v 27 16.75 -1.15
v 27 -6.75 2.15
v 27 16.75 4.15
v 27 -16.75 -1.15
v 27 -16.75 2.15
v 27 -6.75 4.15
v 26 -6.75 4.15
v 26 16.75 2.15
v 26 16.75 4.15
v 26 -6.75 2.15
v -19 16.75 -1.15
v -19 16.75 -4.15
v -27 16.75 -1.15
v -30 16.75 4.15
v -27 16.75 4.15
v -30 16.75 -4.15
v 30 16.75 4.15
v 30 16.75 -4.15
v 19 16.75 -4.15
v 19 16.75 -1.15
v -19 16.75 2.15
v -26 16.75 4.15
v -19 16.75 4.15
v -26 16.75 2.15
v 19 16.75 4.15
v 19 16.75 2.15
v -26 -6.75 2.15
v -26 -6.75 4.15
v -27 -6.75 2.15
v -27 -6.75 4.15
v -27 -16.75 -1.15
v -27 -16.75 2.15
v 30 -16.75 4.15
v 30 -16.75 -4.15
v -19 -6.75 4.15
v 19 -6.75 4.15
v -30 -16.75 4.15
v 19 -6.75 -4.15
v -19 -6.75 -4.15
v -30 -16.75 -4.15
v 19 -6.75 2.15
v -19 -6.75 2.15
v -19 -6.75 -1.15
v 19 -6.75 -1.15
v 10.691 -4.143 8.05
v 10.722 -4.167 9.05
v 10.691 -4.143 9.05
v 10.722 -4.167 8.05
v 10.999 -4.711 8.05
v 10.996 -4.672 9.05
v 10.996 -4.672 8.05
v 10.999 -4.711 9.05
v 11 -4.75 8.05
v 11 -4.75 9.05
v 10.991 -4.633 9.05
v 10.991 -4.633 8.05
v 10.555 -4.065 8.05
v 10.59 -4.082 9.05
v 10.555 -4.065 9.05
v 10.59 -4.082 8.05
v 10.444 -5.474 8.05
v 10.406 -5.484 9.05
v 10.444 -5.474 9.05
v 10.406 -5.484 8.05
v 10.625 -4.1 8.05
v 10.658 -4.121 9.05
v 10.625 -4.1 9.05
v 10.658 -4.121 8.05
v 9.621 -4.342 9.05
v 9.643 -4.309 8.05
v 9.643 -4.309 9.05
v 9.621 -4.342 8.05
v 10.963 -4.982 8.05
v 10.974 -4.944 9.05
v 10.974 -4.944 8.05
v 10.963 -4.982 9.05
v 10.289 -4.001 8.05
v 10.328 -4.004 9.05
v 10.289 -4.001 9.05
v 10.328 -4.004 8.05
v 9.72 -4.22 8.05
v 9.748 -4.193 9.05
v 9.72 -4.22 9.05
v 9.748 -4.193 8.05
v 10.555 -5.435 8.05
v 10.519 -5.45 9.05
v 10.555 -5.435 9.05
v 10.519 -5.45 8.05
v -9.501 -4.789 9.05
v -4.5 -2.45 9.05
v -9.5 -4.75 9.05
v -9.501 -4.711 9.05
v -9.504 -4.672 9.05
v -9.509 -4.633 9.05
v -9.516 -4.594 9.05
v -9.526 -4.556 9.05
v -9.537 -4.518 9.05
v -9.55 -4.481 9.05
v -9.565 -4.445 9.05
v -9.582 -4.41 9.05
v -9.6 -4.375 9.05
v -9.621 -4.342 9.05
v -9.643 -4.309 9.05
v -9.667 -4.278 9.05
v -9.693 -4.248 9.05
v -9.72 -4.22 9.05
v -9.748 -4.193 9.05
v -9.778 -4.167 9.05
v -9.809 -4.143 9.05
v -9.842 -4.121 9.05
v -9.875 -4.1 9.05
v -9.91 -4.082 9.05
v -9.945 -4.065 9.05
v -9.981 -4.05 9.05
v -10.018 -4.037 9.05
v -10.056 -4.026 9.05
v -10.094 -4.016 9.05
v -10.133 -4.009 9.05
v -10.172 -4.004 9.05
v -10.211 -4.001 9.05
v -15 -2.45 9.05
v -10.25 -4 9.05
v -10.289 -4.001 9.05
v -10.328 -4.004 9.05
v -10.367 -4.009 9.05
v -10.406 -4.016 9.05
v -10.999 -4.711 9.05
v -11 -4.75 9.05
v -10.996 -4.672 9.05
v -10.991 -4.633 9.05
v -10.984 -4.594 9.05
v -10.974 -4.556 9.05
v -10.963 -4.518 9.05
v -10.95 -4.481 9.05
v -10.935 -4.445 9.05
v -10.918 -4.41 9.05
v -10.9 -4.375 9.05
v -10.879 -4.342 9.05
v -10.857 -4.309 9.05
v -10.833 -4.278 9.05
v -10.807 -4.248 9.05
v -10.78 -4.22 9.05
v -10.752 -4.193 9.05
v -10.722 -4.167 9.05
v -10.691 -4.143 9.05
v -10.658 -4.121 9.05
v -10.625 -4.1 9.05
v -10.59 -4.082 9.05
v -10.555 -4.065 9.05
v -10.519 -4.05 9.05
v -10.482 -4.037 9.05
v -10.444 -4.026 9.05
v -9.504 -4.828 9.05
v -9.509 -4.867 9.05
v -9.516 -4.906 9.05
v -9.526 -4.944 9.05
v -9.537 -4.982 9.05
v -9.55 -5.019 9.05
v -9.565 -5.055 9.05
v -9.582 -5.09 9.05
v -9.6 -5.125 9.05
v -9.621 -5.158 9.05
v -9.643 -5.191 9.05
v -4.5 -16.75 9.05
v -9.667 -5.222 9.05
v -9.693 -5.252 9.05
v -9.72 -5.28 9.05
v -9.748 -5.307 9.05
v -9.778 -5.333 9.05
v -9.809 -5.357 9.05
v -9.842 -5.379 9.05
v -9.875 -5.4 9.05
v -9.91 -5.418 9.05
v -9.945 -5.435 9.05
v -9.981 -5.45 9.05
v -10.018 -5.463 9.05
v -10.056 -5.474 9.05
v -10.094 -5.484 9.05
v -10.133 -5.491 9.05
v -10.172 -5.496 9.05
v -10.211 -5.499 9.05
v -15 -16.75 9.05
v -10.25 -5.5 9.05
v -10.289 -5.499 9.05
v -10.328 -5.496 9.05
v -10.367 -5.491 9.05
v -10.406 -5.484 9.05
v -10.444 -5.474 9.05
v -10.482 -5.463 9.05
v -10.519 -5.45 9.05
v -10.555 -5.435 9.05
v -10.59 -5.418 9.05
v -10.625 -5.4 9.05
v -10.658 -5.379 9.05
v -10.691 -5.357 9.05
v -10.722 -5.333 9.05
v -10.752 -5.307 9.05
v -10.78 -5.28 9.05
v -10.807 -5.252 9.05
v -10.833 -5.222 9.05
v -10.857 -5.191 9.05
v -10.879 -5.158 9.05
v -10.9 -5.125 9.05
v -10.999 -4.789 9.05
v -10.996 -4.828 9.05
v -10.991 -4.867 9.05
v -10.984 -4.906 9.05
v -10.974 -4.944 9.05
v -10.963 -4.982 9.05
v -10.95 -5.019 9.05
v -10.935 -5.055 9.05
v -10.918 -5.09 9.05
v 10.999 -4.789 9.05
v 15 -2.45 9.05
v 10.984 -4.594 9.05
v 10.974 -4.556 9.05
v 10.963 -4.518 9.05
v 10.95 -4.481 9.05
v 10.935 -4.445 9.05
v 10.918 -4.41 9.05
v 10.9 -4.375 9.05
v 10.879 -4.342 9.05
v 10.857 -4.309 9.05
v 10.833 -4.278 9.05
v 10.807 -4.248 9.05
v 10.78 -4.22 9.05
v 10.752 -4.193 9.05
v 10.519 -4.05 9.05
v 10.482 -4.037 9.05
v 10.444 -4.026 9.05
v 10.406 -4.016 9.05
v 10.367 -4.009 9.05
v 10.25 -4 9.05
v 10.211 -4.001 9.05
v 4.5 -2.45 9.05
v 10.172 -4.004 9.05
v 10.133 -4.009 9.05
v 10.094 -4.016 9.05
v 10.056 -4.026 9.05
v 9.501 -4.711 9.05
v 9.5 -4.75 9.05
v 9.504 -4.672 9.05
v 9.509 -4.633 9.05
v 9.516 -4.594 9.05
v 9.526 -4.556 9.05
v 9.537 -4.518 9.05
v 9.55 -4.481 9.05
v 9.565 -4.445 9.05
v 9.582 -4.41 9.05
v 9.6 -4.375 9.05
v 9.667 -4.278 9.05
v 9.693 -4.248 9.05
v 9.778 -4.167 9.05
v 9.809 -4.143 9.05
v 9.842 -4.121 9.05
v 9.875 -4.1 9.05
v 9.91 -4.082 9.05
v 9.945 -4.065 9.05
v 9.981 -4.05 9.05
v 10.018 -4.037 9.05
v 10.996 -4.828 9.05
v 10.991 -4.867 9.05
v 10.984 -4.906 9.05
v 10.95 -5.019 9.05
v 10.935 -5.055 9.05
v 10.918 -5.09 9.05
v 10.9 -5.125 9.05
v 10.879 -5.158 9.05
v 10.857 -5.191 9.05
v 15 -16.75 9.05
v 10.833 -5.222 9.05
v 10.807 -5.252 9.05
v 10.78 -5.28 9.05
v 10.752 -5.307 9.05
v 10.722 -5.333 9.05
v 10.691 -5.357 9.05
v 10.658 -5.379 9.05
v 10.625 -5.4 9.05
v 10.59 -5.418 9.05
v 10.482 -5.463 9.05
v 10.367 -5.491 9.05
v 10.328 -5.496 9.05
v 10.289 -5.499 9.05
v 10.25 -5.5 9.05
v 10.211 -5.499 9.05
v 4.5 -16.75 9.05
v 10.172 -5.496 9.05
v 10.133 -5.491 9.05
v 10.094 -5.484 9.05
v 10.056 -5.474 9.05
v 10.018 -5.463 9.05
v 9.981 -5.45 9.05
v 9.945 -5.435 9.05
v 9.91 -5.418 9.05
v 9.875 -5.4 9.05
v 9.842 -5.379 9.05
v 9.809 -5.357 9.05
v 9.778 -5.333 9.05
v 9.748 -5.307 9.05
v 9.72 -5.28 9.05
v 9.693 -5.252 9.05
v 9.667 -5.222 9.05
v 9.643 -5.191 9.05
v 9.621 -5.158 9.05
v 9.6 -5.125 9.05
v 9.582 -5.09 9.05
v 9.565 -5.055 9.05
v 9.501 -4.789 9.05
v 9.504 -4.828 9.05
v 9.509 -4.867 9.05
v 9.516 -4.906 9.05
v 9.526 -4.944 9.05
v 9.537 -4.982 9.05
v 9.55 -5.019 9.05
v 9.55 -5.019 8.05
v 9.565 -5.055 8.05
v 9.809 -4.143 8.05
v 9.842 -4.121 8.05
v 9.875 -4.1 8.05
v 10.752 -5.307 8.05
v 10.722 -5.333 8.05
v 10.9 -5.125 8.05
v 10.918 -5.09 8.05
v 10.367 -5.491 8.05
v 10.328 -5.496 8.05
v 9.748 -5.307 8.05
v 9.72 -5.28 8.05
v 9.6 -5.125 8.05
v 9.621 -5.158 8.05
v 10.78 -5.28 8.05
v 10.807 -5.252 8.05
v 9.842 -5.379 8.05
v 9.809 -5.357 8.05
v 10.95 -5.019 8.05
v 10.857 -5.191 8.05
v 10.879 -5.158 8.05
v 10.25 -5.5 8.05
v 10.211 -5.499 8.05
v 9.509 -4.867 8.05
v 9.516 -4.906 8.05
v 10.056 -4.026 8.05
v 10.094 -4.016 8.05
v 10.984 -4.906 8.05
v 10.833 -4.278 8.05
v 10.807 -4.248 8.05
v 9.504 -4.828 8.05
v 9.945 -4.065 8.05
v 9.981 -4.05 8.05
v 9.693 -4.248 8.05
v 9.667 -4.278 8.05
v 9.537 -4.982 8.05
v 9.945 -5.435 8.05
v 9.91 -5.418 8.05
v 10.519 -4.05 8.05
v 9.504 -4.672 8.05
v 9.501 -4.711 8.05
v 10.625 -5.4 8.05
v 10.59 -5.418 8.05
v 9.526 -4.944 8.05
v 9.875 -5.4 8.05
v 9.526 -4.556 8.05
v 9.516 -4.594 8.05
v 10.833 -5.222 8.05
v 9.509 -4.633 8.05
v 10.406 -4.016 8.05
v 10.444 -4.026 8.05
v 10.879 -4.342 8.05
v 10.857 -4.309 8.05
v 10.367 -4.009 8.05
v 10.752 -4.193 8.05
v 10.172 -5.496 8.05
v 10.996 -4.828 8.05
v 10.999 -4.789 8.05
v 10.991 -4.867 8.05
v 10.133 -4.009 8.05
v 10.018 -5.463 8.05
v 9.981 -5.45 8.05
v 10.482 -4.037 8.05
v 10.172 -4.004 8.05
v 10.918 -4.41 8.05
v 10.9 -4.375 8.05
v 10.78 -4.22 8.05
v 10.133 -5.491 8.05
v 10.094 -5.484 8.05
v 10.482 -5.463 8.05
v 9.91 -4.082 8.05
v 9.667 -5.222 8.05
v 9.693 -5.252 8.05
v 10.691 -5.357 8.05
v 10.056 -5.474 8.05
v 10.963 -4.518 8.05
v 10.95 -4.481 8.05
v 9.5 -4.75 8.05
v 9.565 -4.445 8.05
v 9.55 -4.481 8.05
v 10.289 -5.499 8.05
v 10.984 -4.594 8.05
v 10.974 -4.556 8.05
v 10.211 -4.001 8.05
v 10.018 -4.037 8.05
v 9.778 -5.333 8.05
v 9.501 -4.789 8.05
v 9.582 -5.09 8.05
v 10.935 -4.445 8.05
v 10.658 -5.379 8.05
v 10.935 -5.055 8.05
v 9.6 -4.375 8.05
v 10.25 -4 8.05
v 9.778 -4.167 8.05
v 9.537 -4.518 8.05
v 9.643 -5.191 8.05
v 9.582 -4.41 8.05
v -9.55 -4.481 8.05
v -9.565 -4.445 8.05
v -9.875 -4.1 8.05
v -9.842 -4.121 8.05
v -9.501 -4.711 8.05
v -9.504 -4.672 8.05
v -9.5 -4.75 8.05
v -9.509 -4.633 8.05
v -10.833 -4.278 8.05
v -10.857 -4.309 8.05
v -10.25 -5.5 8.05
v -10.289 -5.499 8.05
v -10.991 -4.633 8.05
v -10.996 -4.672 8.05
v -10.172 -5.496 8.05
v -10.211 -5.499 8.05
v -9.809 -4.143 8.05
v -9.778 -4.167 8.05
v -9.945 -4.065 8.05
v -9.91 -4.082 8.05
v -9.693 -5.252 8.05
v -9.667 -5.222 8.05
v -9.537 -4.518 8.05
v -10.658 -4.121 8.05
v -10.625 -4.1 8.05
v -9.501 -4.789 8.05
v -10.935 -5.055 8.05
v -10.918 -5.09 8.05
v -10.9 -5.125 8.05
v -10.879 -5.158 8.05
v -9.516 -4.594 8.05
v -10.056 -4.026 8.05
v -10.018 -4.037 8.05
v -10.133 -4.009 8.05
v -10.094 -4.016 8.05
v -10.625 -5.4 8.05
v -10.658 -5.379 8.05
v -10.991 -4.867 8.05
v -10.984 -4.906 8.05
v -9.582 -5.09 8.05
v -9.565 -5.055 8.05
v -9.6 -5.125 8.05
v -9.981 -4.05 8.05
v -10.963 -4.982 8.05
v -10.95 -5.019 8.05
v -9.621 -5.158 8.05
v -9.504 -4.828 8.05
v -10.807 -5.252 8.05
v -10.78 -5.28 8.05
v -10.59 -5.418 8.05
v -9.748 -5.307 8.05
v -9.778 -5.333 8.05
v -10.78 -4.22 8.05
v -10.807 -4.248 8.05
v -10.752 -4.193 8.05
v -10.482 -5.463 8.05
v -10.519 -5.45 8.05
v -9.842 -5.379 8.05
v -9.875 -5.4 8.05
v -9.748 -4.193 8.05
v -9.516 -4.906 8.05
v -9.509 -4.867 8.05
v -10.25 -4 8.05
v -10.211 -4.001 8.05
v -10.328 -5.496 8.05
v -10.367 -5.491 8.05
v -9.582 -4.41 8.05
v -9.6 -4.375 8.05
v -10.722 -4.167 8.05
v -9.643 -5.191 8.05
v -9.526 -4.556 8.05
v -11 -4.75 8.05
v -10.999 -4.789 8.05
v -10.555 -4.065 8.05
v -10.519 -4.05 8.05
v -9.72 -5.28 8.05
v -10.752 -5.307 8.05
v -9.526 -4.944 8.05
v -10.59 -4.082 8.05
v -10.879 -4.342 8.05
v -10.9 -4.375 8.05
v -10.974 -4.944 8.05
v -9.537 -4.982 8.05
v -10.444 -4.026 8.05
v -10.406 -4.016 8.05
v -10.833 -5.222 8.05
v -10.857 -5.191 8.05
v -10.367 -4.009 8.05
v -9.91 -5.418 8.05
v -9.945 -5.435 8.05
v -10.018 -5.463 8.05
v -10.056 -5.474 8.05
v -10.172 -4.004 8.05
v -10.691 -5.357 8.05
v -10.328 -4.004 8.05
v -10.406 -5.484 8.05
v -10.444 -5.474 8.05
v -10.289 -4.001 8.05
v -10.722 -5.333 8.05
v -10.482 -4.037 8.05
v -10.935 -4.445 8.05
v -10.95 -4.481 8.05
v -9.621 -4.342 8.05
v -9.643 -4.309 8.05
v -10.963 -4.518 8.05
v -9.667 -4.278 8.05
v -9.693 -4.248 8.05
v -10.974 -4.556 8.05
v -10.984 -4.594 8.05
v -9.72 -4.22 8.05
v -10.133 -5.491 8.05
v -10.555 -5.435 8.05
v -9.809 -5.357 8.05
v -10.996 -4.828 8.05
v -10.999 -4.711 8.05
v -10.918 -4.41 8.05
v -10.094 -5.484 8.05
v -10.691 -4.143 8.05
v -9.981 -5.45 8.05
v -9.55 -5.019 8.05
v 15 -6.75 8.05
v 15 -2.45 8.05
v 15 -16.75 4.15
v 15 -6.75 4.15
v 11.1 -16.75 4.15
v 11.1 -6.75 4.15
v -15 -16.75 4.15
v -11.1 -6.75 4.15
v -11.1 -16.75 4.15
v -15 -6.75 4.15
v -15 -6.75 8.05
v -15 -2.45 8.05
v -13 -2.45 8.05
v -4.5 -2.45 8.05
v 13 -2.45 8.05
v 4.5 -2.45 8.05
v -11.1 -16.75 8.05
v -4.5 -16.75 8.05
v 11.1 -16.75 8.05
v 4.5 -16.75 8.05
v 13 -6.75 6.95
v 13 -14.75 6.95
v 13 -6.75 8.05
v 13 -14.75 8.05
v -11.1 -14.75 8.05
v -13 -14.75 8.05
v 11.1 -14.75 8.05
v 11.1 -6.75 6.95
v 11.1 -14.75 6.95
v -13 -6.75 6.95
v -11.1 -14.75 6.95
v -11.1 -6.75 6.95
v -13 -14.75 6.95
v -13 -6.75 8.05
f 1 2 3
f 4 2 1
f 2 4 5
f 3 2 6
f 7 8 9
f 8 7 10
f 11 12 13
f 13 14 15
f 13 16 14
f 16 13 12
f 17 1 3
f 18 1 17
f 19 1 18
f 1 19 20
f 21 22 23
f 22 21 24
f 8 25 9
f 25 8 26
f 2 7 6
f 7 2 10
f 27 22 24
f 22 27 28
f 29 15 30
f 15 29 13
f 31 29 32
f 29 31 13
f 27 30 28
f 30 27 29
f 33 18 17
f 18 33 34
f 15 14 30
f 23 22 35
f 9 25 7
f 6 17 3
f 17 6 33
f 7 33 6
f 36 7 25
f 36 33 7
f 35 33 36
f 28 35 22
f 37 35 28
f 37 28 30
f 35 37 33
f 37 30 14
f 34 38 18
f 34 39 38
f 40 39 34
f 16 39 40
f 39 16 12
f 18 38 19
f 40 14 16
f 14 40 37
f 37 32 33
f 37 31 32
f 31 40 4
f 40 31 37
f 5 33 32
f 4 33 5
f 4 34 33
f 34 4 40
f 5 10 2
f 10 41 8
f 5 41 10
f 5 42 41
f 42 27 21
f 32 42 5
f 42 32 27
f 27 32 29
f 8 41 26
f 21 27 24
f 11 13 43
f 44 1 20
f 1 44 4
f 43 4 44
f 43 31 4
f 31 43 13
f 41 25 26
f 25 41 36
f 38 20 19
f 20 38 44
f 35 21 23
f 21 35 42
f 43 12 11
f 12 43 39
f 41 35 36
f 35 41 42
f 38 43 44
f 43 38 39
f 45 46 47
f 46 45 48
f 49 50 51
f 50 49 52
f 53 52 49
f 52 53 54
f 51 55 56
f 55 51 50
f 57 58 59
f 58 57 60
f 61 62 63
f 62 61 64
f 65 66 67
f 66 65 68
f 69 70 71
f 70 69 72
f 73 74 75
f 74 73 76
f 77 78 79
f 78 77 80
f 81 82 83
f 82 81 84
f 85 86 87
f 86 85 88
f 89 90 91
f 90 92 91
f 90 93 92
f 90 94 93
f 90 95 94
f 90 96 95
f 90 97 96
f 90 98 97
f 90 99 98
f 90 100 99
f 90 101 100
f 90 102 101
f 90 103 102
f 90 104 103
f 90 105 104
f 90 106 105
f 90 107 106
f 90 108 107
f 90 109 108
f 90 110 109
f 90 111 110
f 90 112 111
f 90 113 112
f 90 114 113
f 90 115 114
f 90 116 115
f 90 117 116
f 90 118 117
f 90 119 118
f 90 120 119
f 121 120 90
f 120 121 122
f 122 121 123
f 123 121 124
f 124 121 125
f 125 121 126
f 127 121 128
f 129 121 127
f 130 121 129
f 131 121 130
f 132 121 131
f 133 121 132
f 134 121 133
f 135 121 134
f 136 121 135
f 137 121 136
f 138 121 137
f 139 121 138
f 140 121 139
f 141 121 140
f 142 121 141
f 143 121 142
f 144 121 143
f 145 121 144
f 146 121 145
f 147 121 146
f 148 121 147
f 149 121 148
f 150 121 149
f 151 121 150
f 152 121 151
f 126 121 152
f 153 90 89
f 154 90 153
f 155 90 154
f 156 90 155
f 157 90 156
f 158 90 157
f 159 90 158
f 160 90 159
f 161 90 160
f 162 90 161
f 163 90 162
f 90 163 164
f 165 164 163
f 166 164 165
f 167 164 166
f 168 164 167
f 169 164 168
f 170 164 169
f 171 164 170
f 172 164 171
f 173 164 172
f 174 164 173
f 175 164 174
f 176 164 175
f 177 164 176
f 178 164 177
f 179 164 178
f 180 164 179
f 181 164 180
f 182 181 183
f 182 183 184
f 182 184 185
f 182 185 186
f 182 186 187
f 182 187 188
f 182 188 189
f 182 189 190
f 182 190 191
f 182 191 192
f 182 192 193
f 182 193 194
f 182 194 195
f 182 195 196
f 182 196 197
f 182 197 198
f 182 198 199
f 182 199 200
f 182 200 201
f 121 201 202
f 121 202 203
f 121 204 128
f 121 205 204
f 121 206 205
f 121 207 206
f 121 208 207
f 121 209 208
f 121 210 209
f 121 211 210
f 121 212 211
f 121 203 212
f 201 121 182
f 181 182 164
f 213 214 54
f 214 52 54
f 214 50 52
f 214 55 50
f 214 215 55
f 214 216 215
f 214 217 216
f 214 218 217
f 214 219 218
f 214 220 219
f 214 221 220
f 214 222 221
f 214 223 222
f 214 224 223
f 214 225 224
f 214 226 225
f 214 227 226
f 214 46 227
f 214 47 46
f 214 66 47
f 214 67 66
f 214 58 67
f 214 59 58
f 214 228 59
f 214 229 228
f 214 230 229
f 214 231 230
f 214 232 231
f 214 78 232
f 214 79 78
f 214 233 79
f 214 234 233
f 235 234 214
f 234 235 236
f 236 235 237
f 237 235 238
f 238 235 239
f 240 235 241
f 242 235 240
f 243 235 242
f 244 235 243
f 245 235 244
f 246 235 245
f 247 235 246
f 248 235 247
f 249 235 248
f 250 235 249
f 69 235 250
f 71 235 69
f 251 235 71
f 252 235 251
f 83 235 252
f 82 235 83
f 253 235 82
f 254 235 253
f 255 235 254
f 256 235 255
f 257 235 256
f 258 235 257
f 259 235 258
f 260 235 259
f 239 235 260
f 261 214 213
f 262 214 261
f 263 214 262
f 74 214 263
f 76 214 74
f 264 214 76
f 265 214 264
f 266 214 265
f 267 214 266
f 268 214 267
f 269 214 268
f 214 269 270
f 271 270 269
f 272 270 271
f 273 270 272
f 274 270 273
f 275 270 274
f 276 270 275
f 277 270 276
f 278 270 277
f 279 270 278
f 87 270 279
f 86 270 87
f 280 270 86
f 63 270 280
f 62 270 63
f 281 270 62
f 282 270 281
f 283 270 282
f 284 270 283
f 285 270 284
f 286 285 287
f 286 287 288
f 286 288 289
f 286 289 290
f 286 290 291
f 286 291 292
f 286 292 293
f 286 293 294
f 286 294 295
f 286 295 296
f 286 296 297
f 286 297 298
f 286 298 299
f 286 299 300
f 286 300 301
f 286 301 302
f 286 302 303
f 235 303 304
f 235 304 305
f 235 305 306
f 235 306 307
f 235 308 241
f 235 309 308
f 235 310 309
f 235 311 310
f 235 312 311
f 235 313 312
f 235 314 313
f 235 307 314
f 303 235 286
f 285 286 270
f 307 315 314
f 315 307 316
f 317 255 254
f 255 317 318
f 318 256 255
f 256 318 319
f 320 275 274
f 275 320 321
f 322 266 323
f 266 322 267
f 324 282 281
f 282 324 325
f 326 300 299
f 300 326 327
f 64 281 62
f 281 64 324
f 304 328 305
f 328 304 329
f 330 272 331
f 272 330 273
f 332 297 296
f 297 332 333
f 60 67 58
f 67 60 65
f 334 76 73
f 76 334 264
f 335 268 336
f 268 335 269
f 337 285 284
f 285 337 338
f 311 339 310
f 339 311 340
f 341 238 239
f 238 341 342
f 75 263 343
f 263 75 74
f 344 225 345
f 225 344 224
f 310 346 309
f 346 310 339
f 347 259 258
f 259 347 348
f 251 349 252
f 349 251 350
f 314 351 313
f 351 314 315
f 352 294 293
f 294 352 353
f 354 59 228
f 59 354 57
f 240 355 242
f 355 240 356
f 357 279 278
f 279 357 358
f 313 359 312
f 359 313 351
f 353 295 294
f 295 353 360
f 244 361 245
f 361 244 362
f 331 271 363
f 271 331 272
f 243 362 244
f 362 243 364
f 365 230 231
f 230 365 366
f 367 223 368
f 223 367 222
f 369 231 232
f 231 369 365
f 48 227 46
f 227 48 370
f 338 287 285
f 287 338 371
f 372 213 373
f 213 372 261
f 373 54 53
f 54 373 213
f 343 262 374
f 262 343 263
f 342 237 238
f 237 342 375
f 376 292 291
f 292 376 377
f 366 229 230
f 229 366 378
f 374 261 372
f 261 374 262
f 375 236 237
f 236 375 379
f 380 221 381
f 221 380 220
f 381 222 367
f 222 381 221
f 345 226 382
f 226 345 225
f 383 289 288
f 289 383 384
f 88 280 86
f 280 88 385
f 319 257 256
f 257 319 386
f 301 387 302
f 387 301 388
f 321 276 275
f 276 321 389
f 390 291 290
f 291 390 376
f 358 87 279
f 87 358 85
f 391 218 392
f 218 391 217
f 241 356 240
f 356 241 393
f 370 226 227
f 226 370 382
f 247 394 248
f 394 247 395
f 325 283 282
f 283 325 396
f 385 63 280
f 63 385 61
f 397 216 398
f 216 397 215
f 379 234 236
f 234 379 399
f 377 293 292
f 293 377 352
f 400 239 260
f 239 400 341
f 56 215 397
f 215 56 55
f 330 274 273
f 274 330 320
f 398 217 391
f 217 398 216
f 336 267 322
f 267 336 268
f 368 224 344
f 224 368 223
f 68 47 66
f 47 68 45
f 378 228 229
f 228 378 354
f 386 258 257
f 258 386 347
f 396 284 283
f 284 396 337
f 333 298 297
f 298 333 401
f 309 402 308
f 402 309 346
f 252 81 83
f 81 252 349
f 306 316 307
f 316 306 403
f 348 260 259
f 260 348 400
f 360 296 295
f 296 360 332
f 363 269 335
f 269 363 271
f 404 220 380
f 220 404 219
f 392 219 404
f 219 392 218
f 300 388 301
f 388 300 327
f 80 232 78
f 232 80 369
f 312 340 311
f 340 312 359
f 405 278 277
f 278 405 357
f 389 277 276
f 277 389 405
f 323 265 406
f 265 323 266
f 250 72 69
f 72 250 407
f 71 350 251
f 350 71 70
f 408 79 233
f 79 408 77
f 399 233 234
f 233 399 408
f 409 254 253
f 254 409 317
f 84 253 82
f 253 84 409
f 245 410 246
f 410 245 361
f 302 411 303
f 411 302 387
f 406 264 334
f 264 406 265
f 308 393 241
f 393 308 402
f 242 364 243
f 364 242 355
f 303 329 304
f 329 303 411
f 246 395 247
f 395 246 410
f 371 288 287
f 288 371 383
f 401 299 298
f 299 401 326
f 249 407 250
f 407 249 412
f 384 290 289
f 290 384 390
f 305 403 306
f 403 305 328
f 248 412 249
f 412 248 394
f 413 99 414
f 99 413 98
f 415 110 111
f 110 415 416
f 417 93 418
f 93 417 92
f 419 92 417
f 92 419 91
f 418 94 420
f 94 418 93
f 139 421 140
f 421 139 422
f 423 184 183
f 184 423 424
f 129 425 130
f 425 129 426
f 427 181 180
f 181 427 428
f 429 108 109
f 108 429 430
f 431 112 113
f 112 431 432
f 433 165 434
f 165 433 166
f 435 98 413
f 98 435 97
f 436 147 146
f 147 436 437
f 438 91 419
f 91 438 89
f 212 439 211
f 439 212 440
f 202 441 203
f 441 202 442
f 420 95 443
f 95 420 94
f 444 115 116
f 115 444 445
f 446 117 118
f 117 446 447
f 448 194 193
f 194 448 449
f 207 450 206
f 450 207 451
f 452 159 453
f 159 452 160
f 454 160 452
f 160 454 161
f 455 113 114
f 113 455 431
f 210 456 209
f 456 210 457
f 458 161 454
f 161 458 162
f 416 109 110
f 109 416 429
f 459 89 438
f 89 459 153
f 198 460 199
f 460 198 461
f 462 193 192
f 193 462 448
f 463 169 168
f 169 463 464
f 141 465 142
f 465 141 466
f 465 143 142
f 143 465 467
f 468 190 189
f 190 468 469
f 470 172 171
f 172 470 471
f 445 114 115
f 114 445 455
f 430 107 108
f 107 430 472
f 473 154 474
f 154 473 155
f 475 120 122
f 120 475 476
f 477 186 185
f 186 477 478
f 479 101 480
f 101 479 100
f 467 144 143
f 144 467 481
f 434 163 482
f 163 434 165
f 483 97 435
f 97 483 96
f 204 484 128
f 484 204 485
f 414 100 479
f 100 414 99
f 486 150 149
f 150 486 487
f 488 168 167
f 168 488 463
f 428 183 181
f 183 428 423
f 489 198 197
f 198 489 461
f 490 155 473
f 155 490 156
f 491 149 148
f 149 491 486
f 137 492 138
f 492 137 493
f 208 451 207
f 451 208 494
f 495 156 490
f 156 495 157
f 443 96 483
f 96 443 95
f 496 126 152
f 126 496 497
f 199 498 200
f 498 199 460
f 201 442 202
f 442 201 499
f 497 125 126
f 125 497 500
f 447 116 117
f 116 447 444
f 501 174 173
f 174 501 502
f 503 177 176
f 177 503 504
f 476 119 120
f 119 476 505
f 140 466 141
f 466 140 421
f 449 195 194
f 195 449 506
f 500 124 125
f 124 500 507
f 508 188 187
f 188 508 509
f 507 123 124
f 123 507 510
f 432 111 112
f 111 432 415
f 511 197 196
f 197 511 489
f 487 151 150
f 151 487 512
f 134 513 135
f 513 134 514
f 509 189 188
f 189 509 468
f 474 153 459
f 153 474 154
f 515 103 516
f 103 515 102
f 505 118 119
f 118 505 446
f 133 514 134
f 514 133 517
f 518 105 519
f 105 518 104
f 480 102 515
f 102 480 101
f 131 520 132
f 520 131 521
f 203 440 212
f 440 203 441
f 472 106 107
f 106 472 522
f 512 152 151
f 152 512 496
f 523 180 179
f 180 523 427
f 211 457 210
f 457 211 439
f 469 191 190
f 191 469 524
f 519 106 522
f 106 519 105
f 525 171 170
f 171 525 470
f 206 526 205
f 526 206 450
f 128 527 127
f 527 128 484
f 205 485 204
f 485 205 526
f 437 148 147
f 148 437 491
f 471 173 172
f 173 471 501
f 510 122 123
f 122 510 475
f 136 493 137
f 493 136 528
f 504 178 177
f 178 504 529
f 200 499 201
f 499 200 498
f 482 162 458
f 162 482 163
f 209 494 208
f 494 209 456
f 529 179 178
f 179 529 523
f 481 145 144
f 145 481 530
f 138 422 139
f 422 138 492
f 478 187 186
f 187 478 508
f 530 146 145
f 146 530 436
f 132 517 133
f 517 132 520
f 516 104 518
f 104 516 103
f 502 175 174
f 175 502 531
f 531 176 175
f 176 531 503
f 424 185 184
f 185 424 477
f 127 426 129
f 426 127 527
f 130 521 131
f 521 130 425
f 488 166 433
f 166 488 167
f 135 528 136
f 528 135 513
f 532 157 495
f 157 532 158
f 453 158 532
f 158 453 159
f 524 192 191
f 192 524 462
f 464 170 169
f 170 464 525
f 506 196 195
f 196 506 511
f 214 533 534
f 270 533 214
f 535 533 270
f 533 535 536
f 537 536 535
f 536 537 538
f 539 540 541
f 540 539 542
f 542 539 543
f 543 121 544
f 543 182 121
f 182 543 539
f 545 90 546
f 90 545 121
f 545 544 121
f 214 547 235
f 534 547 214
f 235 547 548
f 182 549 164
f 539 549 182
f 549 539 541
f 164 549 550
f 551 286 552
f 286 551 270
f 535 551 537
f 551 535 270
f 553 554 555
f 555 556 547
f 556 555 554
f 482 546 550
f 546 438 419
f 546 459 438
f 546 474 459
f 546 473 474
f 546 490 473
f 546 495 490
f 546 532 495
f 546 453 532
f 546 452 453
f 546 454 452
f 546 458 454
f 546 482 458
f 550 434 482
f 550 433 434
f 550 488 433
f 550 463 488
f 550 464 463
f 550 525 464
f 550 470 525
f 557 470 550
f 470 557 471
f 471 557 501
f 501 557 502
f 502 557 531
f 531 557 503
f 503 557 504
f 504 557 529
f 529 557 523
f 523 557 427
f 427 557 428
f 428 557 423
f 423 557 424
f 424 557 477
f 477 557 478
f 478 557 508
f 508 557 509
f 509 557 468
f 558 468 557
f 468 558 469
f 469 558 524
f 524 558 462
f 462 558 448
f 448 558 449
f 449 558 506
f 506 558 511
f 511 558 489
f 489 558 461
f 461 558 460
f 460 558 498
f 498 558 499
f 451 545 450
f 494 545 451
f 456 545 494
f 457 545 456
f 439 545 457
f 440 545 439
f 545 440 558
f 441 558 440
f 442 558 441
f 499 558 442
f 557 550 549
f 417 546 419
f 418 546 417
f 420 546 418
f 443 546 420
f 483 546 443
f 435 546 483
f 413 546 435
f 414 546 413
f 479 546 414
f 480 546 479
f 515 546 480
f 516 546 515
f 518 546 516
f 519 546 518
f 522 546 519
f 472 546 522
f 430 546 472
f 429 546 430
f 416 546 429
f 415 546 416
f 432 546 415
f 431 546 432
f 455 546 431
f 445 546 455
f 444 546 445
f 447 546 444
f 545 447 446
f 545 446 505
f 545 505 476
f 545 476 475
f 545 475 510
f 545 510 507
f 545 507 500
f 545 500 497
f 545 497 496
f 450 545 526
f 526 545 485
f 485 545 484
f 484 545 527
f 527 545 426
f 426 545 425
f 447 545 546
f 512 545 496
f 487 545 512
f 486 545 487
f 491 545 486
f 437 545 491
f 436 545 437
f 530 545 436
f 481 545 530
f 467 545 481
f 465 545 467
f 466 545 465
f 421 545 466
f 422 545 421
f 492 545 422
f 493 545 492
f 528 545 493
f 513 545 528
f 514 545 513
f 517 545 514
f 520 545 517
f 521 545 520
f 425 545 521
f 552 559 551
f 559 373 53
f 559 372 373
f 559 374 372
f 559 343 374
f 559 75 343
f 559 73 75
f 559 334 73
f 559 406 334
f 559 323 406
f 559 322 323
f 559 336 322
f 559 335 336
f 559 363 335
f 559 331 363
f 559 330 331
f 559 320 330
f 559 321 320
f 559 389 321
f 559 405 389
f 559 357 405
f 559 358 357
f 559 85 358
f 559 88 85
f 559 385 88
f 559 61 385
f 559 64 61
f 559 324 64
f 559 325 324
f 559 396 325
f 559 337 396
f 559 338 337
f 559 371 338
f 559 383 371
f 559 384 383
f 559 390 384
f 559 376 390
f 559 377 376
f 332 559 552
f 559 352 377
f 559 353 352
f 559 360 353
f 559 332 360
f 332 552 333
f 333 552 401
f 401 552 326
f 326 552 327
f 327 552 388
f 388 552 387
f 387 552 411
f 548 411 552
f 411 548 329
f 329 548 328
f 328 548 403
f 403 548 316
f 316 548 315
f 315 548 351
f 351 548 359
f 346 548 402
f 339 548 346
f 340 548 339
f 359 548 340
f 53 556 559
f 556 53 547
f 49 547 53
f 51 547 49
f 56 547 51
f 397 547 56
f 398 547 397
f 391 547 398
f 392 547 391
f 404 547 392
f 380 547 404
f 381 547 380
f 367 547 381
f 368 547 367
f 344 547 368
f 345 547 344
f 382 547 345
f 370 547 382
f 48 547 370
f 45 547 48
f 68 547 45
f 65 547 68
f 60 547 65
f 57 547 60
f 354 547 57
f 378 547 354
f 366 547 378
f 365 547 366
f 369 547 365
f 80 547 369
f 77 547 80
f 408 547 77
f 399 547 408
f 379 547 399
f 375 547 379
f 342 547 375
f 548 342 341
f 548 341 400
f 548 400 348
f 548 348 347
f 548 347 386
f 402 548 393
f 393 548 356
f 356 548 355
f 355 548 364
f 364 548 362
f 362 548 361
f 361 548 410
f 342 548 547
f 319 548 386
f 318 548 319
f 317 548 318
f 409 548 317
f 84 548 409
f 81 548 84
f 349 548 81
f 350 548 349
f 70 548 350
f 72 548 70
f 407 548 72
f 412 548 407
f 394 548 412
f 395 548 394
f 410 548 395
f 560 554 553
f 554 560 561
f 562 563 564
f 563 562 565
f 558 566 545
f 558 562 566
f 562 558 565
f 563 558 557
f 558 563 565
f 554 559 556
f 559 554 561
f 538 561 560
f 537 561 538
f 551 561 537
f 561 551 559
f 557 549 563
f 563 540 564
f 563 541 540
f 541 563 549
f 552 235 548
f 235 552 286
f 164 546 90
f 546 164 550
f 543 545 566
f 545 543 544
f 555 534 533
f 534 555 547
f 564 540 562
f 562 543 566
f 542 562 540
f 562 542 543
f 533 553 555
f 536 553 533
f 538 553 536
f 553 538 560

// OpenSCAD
/*
    With this code you can make a camera holder for RPI camera from waveshare (http://www.waveshare.com/product/mini-pc/raspberry-pi/cameras/rpi-camera-b.htm) or for V2 RPI camera (https://www.raspberrypi.org/products/camera-module-v2/)
    
    The code was modified from Fernán Federici 2017 version.
    
    This is licensed under the Creative Commons - Attribution license (CC BY 4.0)
    Isaac Núñez 2020.
 
*/

///////////////////////
// Fluopi parameters

holder_x=54;//acrylic bed width to fit into holder
holder_z=3*1.1;//acrylic bed thickness to fit into holder, normally 3 mm acrylic. 1.1 correction factor applied to surpass acrylic manufacture variations.

////////////////////////
// Defined by the user

// Base holder parameters

sca_thick_up = 3; // holder scafold thickness
sca_thick_side = 3; // holder scafold thickness
sca_thick_down = 2; // holder scafold thickness
sca_deep = 10;  // holder scafold back deep, it have to be shorter than the distance to the screws in the camera PCB (14 mm aprox) plus camera hoder "back_thick" parameter.
sca_arms_width = 11; // holder scafold arms width

sca_arms_space = 1;  // space attach relaxation


sca_trans = (sca_thick_up - sca_thick_down)/2; // translate the holder space to achieve the desired up and down thicknes

scafold_x = holder_x + 2*sca_thick_side;
scafold_y = 33.5; // depth
scafold_z = holder_z + sca_thick_up + sca_thick_down;


//camera holder parameters

side_thick = 2; //side support thickness
bottom_thick = 1; // bottom support thickness
back_thick = 2; // back support thickness

scw_r = 1.5/2;   // camera screw radious
scw_b = 2;  // screw hole bottom distance
scw_s = 1.8; // screw hole side distance

/////////////////////
//  Camera details:

////////////////////////////////
// Waveshare Chinesse camera //
///////////////////////////////
waveshare_cam_x=32.2 + 1; // 1mm of error
waveshare_cam_y=32.2; 
waveshare_cam_z=1.5*1.1;//thickness
WS_hold_x = 5.1 - 0.3;    // space between border and cable conector. 0.3 the security factor
WS_hold_y = 4.5 - 0.3;  // space between border and resistor. 0.3 the security factor

WS_scw_b = 2;  // distance from bottom to screw hole center
WS_scw_s = 2; // distance from side to screw hole center
///////////////////
// RPI V2 camera //
///////////////////

RPIV2_cam_x = 25 + 1 ; // 1mm of error
RPIV2_cam_y = 24; 
RPIV2_cam_z = 1 + 0.1; // PCB thickness, 0.1 mm of error
RPIV2_connec_x = 22; // cable conector length
RPIV2_connec_z = 2.7+ 0.1; // cable conector thikness, 0.1 mm error

RPIV2_sensor_x = 8.5 + 0.5; // sensor base length (8.5 mm) or adaptor lenght + 0.5 mm error. For some reason use 16.

V2_hold_x =(RPIV2_cam_x - RPIV2_sensor_x)/2 - 0.3;    // space between camera border and sensor base. 0.3 the security factor
V2_hold_y = 12.5 - 0.2;  // space between border and PCB first obstacle (sensor base or electronic componentes). 0.2 security value. Use value = 12.5 to attach with screws or 7 to not use them.

V2_scw_b = 9.25;  // distance from bottom to screw hole center
V2_scw_s = 2; // distance from side to screw hole center

module cam_holder_base(camera) {
    
    difference(){
        cube([scafold_x,scafold_y,scafold_z], center=true);
        translate([0,0,sca_trans])
        cube([holder_x,scafold_y*1.1,holder_z], center=true);
        // central square hole
        translate([0,sca_deep/2,0])
        cube([scafold_x - 2*sca_arms_width,scafold_y - sca_deep,scafold_z], center=true);
        
        // attach arms hole
        hole_x = holder_x/2-sca_arms_space/2;
        for (a =[hole_x,-hole_x]){
            translate([a,sca_deep/2,scafold_z/2])
            cube([sca_arms_space,scafold_y - sca_deep,scafold_z], center=true);
        }
        
        // screw holes
        scw_h = sca_thick_down; 
    
        if(camera == "waveshare"){
            cam_x = waveshare_cam_x;
            scw_x = WS_scw_s + side_thick;
            scw_y = WS_scw_b + back_thick;
            
            support_x = cam_x+2*side_thick; 
            screw_x = support_x/2-scw_r-scw_x;
        
            for (a =[screw_x,-screw_x]){
                translate([a,-scafold_y/2+scw_r+scw_y,(scafold_z-scw_h)/2])
            //(scafold_z-scw_h)/2
                cylinder(h=scw_h, r=scw_r, $fn=120, center =true);
            }
        }
        else if(camera == "RPIV2"){
            cam_x = RPIV2_cam_x;
            scw_x = V2_scw_s + side_thick;
            scw_y = V2_scw_b + back_thick;
            
            support_x = cam_x+2*side_thick; 
            screw_x = support_x/2-scw_r-scw_x;
            
            for (a =[screw_x,-screw_x]){
                translate([a,-scafold_y/2+scw_r+scw_y,(scafold_z-scw_h)/2])
            //(scafold_z-scw_h)/2
                cylinder(h=scw_h, r=scw_r, $fn=120, center =true);
            }
        }
    }

              
}

module camera_mount(camera){

    if(camera == "waveshare"){
            cam_x = waveshare_cam_x;
            cam_y = waveshare_cam_y;
            cam_z = waveshare_cam_z;
            hold_x = WS_hold_x;
            hold_y = WS_hold_y;
            scw_y = WS_scw_b + back_thick;
            scw_x = WS_scw_s + side_thick;
        
        support_z = cam_z+bottom_thick;
        support_y = hold_y + back_thick;
        support_x = cam_x+2*side_thick; 
        
        
        translate([0,-scafold_y/2 + support_y/2,scafold_z/2+support_z/2])
        difference(){
            cube([support_x,support_y,support_z], center=true);
            translate([0,back_thick/2,-bottom_thick/2])
            cube([cam_x,hold_y,cam_z], center=true);
            cube([cam_x - 2*hold_x,support_y,support_z], center=true);
            
            //Screw holes
            screw_x = support_x/2-scw_r-scw_x;
            for (a =[screw_x,-screw_x]){
                translate([a,-support_y/2+scw_r+scw_y ,0])
                cylinder(h=support_z, r=scw_r, $fn=120, center =true);
            }            
        }    
    }
    
    else if(camera == "RPIV2"){
            cam_x = RPIV2_cam_x;
            cam_y = RPIV2_cam_y;
            cam_z = RPIV2_cam_z;
            hold_x = V2_hold_x;
            hold_y = V2_hold_y;
            base_space = RPIV2_connec_x+0.2;
            scw_y = V2_scw_b + back_thick;
            scw_x = V2_scw_s + side_thick;
        
        support_z = cam_z+bottom_thick + RPIV2_connec_z;
        support_y = hold_y + back_thick;
        support_x = cam_x+2*side_thick;
        
        difference(){ //this is to extend the central hole in the z axis
        translate([0,-scafold_y/2 + support_y/2,scafold_z/2+support_z/2])
        difference(){
            cube([support_x,support_y,support_z], center=true);
            // camera PCB hole
            translate([0,back_thick/2,-bottom_thick/2 + RPIV2_connec_z/2])
            cube([cam_x,hold_y,cam_z], center=true); 
            // base hole
            translate([0,0,-bottom_thick/2])
            cube([base_space,support_y,support_z-bottom_thick], center=true); 
            // camera hole
            translate([0,0,(support_z-bottom_thick)/2])
            cube([RPIV2_sensor_x,support_y,bottom_thick], center=true); 
            
            //Screw holes
            screw_x = support_x/2-scw_r-scw_x;
            for (a =[screw_x,-screw_x]){
                translate([a,-support_y/2+scw_r+scw_y ,0])
                cylinder(h=support_z, r=scw_r, $fn=120, center =true);
            } 
        }
    // extend the central square hole
    translate([0,sca_deep/2,cam_z+ RPIV2_connec_z])
    cube([scafold_x - 2*sca_arms_width,scafold_y - sca_deep,scafold_z], center=true);
    }
        
    }
    
}


//uncomment the one you pretend to use

//camera = "waveshare";
camera = "RPIV2";

cam_holder_base(camera);
camera_mount(camera);
